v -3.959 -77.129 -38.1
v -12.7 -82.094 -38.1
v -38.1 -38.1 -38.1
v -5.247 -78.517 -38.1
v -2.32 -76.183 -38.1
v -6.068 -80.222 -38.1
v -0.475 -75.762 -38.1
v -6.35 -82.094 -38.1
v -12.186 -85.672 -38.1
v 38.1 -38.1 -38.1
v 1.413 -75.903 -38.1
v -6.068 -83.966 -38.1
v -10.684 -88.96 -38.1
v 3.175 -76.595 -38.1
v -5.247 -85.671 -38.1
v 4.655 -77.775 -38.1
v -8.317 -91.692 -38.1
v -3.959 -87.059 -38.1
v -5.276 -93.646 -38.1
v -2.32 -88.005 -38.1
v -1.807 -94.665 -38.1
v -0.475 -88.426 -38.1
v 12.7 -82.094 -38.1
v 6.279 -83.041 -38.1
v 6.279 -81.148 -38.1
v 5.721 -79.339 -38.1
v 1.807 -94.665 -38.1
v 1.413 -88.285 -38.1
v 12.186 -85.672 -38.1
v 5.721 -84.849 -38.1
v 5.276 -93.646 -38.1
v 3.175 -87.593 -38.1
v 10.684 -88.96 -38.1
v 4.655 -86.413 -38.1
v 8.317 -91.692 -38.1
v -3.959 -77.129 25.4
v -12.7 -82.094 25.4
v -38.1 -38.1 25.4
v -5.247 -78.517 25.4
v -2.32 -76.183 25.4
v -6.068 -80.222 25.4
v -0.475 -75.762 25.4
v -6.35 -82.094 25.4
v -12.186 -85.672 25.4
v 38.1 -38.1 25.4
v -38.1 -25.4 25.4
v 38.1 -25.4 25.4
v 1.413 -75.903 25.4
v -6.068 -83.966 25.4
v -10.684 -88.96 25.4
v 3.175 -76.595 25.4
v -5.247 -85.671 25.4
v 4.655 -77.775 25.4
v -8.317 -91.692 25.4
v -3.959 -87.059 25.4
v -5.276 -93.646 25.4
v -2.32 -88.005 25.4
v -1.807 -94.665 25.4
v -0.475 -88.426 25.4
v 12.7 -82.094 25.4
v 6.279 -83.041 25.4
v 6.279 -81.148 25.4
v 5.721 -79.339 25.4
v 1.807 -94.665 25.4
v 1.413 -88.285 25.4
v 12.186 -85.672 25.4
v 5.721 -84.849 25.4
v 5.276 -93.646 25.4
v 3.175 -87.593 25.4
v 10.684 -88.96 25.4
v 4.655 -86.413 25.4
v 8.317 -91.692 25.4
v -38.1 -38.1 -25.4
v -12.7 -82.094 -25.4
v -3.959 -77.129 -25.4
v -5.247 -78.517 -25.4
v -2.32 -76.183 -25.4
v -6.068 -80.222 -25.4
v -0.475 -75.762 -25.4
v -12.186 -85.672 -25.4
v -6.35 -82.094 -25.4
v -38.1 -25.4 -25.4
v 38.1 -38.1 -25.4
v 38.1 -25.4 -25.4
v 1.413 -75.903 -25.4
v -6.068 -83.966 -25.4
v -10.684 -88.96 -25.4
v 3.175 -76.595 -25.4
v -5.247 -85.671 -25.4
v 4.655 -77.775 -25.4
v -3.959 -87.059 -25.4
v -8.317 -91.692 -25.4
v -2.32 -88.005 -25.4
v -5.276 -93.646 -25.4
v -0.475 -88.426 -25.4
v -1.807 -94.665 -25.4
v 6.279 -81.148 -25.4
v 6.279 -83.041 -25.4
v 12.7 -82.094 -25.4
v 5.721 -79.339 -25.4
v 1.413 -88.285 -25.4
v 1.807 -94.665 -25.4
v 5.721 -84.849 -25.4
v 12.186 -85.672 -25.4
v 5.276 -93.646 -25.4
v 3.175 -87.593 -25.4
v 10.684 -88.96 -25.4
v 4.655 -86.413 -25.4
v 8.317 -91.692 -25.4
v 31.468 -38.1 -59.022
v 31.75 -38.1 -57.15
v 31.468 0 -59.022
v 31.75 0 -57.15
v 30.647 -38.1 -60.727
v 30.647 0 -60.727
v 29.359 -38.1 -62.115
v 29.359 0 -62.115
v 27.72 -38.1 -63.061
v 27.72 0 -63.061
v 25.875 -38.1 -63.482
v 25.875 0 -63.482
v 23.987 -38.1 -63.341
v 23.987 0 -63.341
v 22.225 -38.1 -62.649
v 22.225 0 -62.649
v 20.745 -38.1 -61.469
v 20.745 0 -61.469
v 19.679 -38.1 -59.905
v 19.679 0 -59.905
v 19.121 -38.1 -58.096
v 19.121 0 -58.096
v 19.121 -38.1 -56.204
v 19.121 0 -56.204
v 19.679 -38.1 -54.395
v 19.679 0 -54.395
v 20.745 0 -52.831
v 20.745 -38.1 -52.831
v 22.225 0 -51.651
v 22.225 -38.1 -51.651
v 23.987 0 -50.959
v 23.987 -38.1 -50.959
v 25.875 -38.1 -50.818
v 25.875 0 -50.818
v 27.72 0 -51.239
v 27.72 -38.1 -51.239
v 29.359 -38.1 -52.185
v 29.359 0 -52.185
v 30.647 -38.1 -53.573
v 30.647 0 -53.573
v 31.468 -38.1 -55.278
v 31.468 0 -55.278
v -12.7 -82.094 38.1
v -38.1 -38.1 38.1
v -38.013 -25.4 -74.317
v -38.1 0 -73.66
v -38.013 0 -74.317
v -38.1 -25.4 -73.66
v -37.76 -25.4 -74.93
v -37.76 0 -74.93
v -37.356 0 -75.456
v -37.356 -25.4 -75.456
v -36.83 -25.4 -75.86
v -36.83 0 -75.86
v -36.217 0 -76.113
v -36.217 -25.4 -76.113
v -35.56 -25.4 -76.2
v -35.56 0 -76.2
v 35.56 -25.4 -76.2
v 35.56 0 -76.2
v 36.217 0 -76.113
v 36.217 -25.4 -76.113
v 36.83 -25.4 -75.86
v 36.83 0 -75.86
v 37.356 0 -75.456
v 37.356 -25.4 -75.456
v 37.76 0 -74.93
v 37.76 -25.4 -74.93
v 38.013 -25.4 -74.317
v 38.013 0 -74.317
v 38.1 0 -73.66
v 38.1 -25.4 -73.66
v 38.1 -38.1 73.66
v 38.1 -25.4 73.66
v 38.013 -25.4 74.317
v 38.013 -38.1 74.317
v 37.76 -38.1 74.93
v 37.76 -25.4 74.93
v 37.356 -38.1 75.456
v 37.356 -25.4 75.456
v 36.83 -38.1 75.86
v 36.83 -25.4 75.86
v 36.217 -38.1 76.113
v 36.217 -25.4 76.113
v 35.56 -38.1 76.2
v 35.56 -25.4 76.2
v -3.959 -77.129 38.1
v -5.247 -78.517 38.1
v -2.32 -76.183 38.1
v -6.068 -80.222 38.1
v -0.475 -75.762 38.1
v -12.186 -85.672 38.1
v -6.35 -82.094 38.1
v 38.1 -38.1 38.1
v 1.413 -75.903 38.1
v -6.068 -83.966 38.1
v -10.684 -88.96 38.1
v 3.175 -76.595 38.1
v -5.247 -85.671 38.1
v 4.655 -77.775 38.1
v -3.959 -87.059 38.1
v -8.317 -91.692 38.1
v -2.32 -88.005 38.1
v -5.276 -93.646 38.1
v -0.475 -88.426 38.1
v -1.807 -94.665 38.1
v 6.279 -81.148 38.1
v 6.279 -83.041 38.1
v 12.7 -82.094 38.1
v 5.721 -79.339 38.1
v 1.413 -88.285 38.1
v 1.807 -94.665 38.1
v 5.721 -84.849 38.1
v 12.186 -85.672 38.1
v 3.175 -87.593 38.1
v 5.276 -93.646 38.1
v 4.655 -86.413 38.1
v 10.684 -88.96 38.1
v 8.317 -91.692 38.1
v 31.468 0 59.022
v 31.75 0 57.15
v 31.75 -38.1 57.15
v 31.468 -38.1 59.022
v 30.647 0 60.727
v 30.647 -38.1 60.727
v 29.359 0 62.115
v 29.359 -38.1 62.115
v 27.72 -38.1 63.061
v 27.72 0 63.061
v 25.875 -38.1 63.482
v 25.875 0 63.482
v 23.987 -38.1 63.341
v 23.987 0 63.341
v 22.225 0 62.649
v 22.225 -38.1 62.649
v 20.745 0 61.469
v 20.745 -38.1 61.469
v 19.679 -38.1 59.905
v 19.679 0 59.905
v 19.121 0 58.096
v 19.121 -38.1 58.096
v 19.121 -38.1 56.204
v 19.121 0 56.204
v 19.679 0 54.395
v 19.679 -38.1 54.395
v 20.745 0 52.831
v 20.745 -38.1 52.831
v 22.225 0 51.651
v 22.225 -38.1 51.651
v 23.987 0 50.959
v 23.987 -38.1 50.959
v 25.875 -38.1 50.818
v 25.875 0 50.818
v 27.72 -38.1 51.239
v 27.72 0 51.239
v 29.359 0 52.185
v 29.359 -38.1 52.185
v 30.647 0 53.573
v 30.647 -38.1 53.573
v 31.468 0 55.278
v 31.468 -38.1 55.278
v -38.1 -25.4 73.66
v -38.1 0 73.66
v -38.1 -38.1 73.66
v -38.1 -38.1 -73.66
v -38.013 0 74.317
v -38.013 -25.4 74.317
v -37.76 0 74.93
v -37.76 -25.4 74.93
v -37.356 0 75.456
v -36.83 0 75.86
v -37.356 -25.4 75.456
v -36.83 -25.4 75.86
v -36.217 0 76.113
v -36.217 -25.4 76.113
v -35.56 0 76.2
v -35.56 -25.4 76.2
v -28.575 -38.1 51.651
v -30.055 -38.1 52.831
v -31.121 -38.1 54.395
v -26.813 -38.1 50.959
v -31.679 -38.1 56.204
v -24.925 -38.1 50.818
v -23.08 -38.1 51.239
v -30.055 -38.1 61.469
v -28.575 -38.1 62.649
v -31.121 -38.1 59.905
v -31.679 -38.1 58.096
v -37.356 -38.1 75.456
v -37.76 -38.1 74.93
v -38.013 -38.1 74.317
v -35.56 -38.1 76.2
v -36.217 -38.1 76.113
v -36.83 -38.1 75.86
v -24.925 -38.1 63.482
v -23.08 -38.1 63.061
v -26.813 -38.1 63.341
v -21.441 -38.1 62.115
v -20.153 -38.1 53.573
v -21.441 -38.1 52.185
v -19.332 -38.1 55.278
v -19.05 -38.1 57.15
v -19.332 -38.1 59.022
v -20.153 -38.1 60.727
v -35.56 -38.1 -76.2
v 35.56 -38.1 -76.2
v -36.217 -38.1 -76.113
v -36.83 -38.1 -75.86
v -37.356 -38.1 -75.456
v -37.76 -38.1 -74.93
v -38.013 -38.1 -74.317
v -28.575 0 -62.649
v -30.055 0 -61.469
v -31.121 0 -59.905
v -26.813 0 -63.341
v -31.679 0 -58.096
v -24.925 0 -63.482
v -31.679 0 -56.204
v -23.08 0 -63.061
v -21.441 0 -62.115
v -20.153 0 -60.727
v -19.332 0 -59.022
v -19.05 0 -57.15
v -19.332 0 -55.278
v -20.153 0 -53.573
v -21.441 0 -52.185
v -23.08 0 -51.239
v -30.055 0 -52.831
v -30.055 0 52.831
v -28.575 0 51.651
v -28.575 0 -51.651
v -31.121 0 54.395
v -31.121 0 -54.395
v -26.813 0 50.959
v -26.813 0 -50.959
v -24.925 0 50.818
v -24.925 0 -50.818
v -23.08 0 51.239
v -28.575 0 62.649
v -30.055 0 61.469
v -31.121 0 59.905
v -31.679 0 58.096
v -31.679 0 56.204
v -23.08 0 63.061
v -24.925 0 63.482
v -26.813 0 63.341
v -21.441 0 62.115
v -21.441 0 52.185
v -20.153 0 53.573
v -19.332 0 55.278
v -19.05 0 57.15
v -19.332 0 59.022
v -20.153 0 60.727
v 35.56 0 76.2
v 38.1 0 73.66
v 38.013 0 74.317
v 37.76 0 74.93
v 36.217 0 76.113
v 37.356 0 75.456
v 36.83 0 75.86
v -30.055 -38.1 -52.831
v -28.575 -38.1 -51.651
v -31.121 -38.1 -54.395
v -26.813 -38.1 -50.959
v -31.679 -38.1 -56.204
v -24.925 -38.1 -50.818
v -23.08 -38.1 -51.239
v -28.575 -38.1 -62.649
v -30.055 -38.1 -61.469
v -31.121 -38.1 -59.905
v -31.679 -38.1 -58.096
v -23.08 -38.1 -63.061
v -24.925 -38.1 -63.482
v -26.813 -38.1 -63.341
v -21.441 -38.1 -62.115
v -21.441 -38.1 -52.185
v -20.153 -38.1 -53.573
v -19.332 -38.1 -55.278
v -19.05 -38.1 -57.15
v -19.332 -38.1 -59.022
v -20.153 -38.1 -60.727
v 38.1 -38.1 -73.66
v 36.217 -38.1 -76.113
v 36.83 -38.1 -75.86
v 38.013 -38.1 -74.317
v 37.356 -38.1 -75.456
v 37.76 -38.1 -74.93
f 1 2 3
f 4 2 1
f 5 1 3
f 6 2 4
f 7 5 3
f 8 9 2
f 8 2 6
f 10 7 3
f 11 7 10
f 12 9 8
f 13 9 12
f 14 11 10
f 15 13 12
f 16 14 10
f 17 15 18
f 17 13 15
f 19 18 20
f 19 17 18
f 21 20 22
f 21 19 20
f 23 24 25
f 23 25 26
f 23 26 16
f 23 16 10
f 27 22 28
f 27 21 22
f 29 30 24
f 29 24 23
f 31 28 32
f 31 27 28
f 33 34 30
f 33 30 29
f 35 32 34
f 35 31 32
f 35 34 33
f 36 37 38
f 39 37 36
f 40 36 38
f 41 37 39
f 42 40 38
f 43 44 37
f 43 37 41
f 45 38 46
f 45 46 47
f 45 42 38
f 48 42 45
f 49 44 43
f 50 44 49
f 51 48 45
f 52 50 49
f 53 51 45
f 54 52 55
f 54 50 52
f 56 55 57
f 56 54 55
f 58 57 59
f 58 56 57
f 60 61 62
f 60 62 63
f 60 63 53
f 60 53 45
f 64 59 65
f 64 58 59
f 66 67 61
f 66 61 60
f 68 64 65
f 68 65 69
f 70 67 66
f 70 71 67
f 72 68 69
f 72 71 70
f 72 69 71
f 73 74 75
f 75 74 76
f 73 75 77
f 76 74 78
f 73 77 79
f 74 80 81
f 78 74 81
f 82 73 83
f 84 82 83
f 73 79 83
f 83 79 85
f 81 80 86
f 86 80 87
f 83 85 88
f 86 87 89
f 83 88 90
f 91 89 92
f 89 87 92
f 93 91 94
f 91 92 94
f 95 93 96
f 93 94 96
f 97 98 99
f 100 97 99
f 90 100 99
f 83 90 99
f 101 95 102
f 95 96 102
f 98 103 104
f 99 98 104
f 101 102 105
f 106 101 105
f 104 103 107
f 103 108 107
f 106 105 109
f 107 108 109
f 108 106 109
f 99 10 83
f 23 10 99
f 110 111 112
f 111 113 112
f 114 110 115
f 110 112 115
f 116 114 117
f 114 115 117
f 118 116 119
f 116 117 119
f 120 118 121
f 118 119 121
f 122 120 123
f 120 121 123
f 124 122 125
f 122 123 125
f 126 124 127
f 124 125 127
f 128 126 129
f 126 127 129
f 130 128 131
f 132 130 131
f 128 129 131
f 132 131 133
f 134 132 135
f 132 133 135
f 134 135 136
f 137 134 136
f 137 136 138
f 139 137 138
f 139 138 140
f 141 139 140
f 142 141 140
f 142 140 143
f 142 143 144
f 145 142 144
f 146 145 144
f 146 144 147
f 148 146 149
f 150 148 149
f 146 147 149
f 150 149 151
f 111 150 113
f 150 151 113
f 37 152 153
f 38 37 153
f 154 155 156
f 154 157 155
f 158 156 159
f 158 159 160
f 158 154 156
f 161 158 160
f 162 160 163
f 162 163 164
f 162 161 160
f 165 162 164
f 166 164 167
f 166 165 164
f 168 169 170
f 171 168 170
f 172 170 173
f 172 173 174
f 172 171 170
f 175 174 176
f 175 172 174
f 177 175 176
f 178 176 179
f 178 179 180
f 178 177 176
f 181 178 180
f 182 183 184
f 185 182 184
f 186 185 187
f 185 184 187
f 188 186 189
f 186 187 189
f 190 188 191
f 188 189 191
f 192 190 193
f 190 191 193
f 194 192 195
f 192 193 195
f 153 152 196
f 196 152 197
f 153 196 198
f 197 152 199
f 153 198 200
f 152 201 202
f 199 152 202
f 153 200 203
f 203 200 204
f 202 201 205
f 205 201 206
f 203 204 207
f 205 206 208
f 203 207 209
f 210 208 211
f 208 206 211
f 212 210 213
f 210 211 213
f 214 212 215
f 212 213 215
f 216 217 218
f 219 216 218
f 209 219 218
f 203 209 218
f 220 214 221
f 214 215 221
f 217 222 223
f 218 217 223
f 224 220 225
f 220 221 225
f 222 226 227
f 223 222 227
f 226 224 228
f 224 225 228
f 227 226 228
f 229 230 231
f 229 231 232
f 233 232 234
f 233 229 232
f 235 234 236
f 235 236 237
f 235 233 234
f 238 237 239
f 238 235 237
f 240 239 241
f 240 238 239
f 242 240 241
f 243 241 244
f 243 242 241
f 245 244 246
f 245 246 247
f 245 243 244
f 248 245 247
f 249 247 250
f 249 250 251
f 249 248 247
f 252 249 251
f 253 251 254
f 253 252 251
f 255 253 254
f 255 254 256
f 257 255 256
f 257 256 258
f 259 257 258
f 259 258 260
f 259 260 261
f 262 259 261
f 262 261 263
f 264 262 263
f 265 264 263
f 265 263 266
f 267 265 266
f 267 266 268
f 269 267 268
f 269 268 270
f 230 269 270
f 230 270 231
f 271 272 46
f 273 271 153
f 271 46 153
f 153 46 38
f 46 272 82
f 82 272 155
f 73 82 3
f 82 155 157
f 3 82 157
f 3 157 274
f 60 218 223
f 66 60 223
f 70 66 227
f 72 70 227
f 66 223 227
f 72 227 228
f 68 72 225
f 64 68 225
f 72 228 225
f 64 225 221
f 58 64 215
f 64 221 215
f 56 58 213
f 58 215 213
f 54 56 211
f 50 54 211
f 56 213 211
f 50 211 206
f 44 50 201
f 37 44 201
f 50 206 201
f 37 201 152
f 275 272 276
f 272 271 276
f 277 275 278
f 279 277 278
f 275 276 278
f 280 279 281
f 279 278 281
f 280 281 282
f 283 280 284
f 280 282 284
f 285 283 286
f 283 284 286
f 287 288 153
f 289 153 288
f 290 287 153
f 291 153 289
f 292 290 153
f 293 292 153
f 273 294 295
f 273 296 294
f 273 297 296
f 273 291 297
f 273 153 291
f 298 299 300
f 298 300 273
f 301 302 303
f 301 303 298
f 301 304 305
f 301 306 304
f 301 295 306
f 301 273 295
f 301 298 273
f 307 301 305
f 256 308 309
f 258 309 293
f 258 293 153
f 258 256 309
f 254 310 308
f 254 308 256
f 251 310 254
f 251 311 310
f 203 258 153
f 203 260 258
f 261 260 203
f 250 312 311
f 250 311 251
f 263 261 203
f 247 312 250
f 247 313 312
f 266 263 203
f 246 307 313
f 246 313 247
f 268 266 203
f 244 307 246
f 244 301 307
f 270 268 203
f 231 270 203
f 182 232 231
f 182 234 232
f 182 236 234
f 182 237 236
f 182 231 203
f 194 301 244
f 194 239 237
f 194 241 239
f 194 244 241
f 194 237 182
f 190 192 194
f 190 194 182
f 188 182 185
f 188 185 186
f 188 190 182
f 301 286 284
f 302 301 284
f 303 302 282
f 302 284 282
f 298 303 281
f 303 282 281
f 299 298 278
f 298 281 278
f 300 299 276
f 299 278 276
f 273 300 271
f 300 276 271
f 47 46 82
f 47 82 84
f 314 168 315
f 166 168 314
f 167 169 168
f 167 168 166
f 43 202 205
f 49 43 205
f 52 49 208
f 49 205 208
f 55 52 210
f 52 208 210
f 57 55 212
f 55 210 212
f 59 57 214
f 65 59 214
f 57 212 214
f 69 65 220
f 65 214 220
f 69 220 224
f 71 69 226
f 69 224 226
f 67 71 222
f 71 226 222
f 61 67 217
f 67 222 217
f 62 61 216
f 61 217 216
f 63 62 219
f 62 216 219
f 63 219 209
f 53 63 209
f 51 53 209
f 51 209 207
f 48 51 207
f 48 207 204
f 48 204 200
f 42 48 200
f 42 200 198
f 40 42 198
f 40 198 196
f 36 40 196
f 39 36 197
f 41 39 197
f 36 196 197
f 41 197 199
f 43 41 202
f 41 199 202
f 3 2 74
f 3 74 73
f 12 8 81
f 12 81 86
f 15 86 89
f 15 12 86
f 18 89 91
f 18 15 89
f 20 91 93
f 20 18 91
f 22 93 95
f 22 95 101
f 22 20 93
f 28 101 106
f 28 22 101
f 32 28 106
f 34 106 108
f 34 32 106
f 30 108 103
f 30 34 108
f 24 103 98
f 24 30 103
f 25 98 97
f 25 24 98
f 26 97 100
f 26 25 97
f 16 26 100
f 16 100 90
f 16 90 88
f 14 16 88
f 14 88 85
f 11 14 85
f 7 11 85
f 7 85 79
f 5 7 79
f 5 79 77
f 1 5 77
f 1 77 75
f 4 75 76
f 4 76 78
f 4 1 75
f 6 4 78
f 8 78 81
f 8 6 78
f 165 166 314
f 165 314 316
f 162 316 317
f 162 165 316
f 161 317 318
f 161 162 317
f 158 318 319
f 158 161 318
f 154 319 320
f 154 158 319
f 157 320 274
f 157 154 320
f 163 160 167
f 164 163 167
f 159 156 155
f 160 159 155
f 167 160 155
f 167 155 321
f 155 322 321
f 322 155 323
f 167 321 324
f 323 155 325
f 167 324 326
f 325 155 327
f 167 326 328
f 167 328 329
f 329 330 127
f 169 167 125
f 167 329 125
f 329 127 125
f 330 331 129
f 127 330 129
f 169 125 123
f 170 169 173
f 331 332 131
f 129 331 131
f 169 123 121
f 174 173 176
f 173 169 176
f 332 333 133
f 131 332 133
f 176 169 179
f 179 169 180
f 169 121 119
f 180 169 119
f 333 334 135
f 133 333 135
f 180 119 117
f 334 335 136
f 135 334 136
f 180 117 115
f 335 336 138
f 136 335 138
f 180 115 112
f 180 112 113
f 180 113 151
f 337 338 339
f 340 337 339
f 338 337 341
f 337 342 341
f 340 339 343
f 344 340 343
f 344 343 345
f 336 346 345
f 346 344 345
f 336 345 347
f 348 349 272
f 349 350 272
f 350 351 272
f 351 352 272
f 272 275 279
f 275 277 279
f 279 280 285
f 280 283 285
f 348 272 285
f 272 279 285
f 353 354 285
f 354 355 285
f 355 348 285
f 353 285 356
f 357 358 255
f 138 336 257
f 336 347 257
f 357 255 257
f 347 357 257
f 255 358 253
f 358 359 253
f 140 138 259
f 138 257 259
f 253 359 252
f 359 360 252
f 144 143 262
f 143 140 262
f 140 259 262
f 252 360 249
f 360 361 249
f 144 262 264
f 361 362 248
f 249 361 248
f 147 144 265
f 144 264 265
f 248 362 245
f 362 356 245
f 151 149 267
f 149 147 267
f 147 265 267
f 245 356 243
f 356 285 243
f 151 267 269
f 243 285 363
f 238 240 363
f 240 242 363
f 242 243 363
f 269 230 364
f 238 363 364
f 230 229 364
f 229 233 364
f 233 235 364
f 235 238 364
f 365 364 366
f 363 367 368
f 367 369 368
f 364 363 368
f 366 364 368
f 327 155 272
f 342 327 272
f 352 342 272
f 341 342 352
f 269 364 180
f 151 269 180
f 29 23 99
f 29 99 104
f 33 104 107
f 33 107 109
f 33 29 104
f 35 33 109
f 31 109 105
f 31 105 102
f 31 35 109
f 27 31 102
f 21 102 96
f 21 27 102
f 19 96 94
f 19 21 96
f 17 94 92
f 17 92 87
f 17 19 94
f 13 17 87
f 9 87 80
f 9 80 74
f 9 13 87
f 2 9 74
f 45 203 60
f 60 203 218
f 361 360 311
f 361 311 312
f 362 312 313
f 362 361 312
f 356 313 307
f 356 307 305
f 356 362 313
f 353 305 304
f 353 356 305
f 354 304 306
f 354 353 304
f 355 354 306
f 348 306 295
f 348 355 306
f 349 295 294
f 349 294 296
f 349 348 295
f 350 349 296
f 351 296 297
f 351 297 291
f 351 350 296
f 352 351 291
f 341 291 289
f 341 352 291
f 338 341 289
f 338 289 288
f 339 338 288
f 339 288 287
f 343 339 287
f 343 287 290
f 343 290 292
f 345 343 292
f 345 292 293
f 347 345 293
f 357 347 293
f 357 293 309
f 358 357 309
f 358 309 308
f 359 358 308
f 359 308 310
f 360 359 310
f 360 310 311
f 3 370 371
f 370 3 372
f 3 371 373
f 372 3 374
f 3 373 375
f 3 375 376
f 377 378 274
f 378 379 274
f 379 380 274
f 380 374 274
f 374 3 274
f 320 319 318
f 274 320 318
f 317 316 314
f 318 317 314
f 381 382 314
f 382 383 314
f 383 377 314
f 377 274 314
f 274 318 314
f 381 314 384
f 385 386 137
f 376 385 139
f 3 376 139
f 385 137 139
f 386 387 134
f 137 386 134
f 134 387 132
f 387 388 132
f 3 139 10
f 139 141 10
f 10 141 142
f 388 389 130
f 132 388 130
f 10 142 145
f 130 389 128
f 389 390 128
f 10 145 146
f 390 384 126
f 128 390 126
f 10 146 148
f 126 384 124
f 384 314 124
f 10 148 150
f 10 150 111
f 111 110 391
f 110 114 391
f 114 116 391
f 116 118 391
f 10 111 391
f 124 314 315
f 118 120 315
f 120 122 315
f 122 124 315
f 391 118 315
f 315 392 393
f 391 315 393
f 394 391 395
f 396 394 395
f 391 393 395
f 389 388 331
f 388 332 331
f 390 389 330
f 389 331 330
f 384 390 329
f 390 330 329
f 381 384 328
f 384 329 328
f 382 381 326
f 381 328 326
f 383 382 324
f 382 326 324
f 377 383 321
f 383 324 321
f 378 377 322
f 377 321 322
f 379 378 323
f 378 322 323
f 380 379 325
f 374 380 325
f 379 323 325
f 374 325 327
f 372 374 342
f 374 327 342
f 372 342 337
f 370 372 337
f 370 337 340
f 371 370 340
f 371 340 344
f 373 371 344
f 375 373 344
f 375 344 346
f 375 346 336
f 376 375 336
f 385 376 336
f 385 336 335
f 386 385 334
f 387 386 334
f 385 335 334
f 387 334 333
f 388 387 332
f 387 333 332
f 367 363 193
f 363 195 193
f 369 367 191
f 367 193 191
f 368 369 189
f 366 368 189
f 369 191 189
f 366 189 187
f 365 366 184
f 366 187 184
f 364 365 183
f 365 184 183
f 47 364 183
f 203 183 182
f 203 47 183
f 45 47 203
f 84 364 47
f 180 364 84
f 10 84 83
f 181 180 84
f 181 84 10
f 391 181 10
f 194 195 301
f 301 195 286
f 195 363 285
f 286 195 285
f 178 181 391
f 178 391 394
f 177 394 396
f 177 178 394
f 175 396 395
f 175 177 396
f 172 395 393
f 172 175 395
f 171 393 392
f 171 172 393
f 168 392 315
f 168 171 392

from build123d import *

# Parameters (mm, degrees)
F0_W     = 76.2
F0_H     = 152.4
F0_R     = 6.35
F1_DEPTH = 25.4
F2_R     = 2.54
F3_R     = 6.35
F4_DEPTH = 12.7
F5_W     = 76.2
F5_H     = 12.7
F6_DEPTH = 12.7


with BuildPart() as f1:
    # F0 (on Front) → F1 (new body)
    with BuildSketch(Plane.XZ):
        Rectangle(F0_W, F0_H)
        with Locations((-25.4, -57.15)):
            Circle(F0_R, mode=Mode.SUBTRACT)
        with Locations((25.4, -57.15)):
            Circle(F0_R, mode=Mode.SUBTRACT)
        with Locations((-25.4, 57.15)):
            Circle(F0_R, mode=Mode.SUBTRACT)
        with Locations((25.4, 57.15)):
            Circle(F0_R, mode=Mode.SUBTRACT)
    extrude(amount=F1_DEPTH)

    # F2
    f2_edges = [f1.edges().sort_by_distance(p)[0] for p in [
        (-38.1, -12.7, 76.2),
        (-38.1, -12.7, -76.2),
        (38.1, -12.7, -76.2),
        (38.1, -12.7, 76.2),
    ]]
    fillet(f2_edges, radius=F2_R)

    # F3 (on face) → F4 (join)
    with BuildSketch(Plane.XZ.offset(25.4)):
        with BuildLine():
            ThreePointArc((38.1, 73.66), (37.3560512242, 75.4560512242), (35.56, 76.2))
            Line((35.56, 76.2), (-35.56, 76.2))
            ThreePointArc((-35.56, 76.2), (-37.3560512242, 75.4560512242), (-38.1, 73.66))
            Line((-38.1, 73.66), (-38.1, 38.1))
            Line((-38.1, 38.1), (38.1, 38.1))
            Line((38.1, 38.1), (38.1, 73.66))
        make_face()
        with Locations((-25.4, 57.15)):
            Circle(F3_R, mode=Mode.SUBTRACT)
        with Locations((25.4, 57.15)):
            Circle(F3_R, mode=Mode.SUBTRACT)
    extrude(amount=F4_DEPTH)

    # F5 (on face) → F6 (join)
    with BuildSketch(Plane(origin=(0, 0, 38.1), x_dir=(1, 0, 0), z_dir=(0, 0, -1))):
        with BuildLine():
            Line((-12.7, 82.0940905122), (-38.1, 38.1))
            Line((-38.1, 38.1), (38.1, 38.1))
            Line((38.1, 38.1), (12.7, 82.0940905122))
            ThreePointArc((12.7, 82.0940905122), (0, 69.3940905122), (-12.7, 82.0940905122))
        make_face()
        with BuildLine():
            Line((-6.35, 82.0940905122), (-12.7, 82.0940905122))
            ThreePointArc((-12.7, 82.0940905122), (0, 69.3940905122), (12.7, 82.0940905122))
            Line((12.7, 82.0940905122), (6.35, 82.0940905122))
            ThreePointArc((6.35, 82.0940905122), (0, 75.7440905122), (-6.35, 82.0940905122))
        make_face()
        with BuildLine():
            ThreePointArc((12.7, 82.0940905122), (0, 94.7940905122), (-12.7, 82.0940905122))
            Line((-12.7, 82.0940905122), (-6.35, 82.0940905122))
            ThreePointArc((-6.35, 82.0940905122), (0, 88.4440905122), (6.35, 82.0940905122))
            Line((6.35, 82.0940905122), (12.7, 82.0940905122))
        make_face()
        with Locations((0, 31.75)):
            Rectangle(F5_W, F5_H)
    extrude(amount=F6_DEPTH)

    # F7: F1 across plane


with BuildPart() as f1_1:
    add(f1.part)
    add(f1.part.mirror(Plane.XY))


solid = f1_1.part
